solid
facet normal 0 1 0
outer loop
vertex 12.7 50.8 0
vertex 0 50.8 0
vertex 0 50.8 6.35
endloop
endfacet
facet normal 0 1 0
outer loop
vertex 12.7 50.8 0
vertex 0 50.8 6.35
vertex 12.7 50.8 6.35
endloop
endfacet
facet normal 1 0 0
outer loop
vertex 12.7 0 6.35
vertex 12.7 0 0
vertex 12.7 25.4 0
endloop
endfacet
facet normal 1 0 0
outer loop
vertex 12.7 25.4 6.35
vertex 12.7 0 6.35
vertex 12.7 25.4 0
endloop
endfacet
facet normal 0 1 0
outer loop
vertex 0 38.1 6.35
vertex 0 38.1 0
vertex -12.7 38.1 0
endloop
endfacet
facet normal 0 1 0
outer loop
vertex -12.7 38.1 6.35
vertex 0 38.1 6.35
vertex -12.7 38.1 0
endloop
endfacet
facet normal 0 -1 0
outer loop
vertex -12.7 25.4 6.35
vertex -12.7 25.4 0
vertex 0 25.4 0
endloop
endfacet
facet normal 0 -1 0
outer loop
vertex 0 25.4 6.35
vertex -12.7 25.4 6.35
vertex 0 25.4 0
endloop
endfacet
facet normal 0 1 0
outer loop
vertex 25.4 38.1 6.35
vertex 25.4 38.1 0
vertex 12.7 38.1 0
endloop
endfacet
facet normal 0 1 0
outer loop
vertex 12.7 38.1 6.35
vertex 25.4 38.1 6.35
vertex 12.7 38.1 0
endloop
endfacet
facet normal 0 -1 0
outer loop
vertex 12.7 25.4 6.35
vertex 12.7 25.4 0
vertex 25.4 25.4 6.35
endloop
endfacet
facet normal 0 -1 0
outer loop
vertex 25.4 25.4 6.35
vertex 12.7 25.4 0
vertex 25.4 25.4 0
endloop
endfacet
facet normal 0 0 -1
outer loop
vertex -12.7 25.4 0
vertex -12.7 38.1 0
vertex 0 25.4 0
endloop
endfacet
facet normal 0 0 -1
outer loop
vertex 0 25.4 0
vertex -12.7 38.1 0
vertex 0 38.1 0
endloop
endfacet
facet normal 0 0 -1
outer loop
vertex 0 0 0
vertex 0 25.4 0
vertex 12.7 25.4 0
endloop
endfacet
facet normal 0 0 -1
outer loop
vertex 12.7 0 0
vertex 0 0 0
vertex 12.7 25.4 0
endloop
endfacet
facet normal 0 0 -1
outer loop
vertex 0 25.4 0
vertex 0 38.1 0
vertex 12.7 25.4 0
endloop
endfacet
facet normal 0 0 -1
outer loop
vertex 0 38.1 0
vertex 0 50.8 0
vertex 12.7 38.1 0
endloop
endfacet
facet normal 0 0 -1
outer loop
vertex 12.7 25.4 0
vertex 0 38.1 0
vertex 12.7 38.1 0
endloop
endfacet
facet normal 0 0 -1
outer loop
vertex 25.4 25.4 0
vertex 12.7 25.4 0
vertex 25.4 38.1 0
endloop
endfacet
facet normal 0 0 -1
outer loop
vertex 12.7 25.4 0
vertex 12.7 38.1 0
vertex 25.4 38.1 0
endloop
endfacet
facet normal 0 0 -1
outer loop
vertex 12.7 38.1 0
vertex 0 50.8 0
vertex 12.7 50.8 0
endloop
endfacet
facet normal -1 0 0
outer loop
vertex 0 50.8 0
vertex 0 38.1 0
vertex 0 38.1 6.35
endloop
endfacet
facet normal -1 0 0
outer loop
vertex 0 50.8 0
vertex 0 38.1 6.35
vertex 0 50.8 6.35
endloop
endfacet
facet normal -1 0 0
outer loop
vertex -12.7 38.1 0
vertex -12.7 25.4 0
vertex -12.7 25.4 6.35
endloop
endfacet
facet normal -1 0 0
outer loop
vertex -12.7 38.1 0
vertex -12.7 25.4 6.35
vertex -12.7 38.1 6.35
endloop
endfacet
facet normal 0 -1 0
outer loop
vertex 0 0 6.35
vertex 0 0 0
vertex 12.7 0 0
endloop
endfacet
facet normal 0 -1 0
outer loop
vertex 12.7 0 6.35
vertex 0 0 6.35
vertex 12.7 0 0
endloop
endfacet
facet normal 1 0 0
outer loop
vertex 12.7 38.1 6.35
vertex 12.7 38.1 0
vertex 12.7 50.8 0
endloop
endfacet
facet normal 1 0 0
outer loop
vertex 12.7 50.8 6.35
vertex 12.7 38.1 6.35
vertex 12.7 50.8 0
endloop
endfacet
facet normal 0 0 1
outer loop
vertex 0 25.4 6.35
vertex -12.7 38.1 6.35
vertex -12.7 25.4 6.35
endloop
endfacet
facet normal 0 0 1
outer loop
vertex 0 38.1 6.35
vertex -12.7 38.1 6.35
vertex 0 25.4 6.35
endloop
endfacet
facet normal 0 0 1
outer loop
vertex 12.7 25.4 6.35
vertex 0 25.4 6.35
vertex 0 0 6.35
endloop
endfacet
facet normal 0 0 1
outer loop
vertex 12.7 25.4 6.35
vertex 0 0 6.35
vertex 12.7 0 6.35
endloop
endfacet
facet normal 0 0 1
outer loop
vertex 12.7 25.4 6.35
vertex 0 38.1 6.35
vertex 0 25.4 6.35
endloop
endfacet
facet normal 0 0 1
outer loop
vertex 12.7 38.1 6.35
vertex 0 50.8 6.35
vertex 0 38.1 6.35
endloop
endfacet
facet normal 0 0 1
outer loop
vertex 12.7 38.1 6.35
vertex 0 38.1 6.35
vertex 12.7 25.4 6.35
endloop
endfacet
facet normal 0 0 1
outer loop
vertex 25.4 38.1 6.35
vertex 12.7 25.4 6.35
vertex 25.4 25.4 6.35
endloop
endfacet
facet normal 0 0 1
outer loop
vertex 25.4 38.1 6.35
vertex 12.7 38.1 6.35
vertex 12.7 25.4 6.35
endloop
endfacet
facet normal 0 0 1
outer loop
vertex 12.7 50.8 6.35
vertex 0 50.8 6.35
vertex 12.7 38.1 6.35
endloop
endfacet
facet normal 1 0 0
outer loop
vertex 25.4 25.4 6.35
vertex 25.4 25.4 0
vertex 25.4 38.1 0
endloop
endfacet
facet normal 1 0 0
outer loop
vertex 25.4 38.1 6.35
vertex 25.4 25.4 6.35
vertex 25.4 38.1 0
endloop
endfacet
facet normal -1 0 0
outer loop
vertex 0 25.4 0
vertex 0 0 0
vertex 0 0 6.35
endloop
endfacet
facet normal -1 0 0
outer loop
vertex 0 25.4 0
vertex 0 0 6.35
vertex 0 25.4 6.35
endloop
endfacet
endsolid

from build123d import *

# Parameters (mm, degrees)
F0_W     = 12.7
F0_H     = 25.4
F0_H_2   = 12.7
F1_DEPTH = 6.35


with BuildPart() as f1:
    # F0 (on Top) → F1 (new body)
    with BuildSketch(Plane.XY):
        with Locations((6.35, 12.7)):
            Rectangle(F0_W, F0_H)
        with Locations((-6.35, 31.75)):
            Rectangle(F0_W, F0_H_2)
        with Locations((6.35, 31.75)):
            Rectangle(F0_W, F0_H_2)
        with Locations((19.05, 31.75)):
            Rectangle(F0_W, F0_H_2)
        with Locations((6.35, 44.45)):
            Rectangle(F0_W, F0_H_2)
    extrude(amount=F1_DEPTH)


solid = f1.part
